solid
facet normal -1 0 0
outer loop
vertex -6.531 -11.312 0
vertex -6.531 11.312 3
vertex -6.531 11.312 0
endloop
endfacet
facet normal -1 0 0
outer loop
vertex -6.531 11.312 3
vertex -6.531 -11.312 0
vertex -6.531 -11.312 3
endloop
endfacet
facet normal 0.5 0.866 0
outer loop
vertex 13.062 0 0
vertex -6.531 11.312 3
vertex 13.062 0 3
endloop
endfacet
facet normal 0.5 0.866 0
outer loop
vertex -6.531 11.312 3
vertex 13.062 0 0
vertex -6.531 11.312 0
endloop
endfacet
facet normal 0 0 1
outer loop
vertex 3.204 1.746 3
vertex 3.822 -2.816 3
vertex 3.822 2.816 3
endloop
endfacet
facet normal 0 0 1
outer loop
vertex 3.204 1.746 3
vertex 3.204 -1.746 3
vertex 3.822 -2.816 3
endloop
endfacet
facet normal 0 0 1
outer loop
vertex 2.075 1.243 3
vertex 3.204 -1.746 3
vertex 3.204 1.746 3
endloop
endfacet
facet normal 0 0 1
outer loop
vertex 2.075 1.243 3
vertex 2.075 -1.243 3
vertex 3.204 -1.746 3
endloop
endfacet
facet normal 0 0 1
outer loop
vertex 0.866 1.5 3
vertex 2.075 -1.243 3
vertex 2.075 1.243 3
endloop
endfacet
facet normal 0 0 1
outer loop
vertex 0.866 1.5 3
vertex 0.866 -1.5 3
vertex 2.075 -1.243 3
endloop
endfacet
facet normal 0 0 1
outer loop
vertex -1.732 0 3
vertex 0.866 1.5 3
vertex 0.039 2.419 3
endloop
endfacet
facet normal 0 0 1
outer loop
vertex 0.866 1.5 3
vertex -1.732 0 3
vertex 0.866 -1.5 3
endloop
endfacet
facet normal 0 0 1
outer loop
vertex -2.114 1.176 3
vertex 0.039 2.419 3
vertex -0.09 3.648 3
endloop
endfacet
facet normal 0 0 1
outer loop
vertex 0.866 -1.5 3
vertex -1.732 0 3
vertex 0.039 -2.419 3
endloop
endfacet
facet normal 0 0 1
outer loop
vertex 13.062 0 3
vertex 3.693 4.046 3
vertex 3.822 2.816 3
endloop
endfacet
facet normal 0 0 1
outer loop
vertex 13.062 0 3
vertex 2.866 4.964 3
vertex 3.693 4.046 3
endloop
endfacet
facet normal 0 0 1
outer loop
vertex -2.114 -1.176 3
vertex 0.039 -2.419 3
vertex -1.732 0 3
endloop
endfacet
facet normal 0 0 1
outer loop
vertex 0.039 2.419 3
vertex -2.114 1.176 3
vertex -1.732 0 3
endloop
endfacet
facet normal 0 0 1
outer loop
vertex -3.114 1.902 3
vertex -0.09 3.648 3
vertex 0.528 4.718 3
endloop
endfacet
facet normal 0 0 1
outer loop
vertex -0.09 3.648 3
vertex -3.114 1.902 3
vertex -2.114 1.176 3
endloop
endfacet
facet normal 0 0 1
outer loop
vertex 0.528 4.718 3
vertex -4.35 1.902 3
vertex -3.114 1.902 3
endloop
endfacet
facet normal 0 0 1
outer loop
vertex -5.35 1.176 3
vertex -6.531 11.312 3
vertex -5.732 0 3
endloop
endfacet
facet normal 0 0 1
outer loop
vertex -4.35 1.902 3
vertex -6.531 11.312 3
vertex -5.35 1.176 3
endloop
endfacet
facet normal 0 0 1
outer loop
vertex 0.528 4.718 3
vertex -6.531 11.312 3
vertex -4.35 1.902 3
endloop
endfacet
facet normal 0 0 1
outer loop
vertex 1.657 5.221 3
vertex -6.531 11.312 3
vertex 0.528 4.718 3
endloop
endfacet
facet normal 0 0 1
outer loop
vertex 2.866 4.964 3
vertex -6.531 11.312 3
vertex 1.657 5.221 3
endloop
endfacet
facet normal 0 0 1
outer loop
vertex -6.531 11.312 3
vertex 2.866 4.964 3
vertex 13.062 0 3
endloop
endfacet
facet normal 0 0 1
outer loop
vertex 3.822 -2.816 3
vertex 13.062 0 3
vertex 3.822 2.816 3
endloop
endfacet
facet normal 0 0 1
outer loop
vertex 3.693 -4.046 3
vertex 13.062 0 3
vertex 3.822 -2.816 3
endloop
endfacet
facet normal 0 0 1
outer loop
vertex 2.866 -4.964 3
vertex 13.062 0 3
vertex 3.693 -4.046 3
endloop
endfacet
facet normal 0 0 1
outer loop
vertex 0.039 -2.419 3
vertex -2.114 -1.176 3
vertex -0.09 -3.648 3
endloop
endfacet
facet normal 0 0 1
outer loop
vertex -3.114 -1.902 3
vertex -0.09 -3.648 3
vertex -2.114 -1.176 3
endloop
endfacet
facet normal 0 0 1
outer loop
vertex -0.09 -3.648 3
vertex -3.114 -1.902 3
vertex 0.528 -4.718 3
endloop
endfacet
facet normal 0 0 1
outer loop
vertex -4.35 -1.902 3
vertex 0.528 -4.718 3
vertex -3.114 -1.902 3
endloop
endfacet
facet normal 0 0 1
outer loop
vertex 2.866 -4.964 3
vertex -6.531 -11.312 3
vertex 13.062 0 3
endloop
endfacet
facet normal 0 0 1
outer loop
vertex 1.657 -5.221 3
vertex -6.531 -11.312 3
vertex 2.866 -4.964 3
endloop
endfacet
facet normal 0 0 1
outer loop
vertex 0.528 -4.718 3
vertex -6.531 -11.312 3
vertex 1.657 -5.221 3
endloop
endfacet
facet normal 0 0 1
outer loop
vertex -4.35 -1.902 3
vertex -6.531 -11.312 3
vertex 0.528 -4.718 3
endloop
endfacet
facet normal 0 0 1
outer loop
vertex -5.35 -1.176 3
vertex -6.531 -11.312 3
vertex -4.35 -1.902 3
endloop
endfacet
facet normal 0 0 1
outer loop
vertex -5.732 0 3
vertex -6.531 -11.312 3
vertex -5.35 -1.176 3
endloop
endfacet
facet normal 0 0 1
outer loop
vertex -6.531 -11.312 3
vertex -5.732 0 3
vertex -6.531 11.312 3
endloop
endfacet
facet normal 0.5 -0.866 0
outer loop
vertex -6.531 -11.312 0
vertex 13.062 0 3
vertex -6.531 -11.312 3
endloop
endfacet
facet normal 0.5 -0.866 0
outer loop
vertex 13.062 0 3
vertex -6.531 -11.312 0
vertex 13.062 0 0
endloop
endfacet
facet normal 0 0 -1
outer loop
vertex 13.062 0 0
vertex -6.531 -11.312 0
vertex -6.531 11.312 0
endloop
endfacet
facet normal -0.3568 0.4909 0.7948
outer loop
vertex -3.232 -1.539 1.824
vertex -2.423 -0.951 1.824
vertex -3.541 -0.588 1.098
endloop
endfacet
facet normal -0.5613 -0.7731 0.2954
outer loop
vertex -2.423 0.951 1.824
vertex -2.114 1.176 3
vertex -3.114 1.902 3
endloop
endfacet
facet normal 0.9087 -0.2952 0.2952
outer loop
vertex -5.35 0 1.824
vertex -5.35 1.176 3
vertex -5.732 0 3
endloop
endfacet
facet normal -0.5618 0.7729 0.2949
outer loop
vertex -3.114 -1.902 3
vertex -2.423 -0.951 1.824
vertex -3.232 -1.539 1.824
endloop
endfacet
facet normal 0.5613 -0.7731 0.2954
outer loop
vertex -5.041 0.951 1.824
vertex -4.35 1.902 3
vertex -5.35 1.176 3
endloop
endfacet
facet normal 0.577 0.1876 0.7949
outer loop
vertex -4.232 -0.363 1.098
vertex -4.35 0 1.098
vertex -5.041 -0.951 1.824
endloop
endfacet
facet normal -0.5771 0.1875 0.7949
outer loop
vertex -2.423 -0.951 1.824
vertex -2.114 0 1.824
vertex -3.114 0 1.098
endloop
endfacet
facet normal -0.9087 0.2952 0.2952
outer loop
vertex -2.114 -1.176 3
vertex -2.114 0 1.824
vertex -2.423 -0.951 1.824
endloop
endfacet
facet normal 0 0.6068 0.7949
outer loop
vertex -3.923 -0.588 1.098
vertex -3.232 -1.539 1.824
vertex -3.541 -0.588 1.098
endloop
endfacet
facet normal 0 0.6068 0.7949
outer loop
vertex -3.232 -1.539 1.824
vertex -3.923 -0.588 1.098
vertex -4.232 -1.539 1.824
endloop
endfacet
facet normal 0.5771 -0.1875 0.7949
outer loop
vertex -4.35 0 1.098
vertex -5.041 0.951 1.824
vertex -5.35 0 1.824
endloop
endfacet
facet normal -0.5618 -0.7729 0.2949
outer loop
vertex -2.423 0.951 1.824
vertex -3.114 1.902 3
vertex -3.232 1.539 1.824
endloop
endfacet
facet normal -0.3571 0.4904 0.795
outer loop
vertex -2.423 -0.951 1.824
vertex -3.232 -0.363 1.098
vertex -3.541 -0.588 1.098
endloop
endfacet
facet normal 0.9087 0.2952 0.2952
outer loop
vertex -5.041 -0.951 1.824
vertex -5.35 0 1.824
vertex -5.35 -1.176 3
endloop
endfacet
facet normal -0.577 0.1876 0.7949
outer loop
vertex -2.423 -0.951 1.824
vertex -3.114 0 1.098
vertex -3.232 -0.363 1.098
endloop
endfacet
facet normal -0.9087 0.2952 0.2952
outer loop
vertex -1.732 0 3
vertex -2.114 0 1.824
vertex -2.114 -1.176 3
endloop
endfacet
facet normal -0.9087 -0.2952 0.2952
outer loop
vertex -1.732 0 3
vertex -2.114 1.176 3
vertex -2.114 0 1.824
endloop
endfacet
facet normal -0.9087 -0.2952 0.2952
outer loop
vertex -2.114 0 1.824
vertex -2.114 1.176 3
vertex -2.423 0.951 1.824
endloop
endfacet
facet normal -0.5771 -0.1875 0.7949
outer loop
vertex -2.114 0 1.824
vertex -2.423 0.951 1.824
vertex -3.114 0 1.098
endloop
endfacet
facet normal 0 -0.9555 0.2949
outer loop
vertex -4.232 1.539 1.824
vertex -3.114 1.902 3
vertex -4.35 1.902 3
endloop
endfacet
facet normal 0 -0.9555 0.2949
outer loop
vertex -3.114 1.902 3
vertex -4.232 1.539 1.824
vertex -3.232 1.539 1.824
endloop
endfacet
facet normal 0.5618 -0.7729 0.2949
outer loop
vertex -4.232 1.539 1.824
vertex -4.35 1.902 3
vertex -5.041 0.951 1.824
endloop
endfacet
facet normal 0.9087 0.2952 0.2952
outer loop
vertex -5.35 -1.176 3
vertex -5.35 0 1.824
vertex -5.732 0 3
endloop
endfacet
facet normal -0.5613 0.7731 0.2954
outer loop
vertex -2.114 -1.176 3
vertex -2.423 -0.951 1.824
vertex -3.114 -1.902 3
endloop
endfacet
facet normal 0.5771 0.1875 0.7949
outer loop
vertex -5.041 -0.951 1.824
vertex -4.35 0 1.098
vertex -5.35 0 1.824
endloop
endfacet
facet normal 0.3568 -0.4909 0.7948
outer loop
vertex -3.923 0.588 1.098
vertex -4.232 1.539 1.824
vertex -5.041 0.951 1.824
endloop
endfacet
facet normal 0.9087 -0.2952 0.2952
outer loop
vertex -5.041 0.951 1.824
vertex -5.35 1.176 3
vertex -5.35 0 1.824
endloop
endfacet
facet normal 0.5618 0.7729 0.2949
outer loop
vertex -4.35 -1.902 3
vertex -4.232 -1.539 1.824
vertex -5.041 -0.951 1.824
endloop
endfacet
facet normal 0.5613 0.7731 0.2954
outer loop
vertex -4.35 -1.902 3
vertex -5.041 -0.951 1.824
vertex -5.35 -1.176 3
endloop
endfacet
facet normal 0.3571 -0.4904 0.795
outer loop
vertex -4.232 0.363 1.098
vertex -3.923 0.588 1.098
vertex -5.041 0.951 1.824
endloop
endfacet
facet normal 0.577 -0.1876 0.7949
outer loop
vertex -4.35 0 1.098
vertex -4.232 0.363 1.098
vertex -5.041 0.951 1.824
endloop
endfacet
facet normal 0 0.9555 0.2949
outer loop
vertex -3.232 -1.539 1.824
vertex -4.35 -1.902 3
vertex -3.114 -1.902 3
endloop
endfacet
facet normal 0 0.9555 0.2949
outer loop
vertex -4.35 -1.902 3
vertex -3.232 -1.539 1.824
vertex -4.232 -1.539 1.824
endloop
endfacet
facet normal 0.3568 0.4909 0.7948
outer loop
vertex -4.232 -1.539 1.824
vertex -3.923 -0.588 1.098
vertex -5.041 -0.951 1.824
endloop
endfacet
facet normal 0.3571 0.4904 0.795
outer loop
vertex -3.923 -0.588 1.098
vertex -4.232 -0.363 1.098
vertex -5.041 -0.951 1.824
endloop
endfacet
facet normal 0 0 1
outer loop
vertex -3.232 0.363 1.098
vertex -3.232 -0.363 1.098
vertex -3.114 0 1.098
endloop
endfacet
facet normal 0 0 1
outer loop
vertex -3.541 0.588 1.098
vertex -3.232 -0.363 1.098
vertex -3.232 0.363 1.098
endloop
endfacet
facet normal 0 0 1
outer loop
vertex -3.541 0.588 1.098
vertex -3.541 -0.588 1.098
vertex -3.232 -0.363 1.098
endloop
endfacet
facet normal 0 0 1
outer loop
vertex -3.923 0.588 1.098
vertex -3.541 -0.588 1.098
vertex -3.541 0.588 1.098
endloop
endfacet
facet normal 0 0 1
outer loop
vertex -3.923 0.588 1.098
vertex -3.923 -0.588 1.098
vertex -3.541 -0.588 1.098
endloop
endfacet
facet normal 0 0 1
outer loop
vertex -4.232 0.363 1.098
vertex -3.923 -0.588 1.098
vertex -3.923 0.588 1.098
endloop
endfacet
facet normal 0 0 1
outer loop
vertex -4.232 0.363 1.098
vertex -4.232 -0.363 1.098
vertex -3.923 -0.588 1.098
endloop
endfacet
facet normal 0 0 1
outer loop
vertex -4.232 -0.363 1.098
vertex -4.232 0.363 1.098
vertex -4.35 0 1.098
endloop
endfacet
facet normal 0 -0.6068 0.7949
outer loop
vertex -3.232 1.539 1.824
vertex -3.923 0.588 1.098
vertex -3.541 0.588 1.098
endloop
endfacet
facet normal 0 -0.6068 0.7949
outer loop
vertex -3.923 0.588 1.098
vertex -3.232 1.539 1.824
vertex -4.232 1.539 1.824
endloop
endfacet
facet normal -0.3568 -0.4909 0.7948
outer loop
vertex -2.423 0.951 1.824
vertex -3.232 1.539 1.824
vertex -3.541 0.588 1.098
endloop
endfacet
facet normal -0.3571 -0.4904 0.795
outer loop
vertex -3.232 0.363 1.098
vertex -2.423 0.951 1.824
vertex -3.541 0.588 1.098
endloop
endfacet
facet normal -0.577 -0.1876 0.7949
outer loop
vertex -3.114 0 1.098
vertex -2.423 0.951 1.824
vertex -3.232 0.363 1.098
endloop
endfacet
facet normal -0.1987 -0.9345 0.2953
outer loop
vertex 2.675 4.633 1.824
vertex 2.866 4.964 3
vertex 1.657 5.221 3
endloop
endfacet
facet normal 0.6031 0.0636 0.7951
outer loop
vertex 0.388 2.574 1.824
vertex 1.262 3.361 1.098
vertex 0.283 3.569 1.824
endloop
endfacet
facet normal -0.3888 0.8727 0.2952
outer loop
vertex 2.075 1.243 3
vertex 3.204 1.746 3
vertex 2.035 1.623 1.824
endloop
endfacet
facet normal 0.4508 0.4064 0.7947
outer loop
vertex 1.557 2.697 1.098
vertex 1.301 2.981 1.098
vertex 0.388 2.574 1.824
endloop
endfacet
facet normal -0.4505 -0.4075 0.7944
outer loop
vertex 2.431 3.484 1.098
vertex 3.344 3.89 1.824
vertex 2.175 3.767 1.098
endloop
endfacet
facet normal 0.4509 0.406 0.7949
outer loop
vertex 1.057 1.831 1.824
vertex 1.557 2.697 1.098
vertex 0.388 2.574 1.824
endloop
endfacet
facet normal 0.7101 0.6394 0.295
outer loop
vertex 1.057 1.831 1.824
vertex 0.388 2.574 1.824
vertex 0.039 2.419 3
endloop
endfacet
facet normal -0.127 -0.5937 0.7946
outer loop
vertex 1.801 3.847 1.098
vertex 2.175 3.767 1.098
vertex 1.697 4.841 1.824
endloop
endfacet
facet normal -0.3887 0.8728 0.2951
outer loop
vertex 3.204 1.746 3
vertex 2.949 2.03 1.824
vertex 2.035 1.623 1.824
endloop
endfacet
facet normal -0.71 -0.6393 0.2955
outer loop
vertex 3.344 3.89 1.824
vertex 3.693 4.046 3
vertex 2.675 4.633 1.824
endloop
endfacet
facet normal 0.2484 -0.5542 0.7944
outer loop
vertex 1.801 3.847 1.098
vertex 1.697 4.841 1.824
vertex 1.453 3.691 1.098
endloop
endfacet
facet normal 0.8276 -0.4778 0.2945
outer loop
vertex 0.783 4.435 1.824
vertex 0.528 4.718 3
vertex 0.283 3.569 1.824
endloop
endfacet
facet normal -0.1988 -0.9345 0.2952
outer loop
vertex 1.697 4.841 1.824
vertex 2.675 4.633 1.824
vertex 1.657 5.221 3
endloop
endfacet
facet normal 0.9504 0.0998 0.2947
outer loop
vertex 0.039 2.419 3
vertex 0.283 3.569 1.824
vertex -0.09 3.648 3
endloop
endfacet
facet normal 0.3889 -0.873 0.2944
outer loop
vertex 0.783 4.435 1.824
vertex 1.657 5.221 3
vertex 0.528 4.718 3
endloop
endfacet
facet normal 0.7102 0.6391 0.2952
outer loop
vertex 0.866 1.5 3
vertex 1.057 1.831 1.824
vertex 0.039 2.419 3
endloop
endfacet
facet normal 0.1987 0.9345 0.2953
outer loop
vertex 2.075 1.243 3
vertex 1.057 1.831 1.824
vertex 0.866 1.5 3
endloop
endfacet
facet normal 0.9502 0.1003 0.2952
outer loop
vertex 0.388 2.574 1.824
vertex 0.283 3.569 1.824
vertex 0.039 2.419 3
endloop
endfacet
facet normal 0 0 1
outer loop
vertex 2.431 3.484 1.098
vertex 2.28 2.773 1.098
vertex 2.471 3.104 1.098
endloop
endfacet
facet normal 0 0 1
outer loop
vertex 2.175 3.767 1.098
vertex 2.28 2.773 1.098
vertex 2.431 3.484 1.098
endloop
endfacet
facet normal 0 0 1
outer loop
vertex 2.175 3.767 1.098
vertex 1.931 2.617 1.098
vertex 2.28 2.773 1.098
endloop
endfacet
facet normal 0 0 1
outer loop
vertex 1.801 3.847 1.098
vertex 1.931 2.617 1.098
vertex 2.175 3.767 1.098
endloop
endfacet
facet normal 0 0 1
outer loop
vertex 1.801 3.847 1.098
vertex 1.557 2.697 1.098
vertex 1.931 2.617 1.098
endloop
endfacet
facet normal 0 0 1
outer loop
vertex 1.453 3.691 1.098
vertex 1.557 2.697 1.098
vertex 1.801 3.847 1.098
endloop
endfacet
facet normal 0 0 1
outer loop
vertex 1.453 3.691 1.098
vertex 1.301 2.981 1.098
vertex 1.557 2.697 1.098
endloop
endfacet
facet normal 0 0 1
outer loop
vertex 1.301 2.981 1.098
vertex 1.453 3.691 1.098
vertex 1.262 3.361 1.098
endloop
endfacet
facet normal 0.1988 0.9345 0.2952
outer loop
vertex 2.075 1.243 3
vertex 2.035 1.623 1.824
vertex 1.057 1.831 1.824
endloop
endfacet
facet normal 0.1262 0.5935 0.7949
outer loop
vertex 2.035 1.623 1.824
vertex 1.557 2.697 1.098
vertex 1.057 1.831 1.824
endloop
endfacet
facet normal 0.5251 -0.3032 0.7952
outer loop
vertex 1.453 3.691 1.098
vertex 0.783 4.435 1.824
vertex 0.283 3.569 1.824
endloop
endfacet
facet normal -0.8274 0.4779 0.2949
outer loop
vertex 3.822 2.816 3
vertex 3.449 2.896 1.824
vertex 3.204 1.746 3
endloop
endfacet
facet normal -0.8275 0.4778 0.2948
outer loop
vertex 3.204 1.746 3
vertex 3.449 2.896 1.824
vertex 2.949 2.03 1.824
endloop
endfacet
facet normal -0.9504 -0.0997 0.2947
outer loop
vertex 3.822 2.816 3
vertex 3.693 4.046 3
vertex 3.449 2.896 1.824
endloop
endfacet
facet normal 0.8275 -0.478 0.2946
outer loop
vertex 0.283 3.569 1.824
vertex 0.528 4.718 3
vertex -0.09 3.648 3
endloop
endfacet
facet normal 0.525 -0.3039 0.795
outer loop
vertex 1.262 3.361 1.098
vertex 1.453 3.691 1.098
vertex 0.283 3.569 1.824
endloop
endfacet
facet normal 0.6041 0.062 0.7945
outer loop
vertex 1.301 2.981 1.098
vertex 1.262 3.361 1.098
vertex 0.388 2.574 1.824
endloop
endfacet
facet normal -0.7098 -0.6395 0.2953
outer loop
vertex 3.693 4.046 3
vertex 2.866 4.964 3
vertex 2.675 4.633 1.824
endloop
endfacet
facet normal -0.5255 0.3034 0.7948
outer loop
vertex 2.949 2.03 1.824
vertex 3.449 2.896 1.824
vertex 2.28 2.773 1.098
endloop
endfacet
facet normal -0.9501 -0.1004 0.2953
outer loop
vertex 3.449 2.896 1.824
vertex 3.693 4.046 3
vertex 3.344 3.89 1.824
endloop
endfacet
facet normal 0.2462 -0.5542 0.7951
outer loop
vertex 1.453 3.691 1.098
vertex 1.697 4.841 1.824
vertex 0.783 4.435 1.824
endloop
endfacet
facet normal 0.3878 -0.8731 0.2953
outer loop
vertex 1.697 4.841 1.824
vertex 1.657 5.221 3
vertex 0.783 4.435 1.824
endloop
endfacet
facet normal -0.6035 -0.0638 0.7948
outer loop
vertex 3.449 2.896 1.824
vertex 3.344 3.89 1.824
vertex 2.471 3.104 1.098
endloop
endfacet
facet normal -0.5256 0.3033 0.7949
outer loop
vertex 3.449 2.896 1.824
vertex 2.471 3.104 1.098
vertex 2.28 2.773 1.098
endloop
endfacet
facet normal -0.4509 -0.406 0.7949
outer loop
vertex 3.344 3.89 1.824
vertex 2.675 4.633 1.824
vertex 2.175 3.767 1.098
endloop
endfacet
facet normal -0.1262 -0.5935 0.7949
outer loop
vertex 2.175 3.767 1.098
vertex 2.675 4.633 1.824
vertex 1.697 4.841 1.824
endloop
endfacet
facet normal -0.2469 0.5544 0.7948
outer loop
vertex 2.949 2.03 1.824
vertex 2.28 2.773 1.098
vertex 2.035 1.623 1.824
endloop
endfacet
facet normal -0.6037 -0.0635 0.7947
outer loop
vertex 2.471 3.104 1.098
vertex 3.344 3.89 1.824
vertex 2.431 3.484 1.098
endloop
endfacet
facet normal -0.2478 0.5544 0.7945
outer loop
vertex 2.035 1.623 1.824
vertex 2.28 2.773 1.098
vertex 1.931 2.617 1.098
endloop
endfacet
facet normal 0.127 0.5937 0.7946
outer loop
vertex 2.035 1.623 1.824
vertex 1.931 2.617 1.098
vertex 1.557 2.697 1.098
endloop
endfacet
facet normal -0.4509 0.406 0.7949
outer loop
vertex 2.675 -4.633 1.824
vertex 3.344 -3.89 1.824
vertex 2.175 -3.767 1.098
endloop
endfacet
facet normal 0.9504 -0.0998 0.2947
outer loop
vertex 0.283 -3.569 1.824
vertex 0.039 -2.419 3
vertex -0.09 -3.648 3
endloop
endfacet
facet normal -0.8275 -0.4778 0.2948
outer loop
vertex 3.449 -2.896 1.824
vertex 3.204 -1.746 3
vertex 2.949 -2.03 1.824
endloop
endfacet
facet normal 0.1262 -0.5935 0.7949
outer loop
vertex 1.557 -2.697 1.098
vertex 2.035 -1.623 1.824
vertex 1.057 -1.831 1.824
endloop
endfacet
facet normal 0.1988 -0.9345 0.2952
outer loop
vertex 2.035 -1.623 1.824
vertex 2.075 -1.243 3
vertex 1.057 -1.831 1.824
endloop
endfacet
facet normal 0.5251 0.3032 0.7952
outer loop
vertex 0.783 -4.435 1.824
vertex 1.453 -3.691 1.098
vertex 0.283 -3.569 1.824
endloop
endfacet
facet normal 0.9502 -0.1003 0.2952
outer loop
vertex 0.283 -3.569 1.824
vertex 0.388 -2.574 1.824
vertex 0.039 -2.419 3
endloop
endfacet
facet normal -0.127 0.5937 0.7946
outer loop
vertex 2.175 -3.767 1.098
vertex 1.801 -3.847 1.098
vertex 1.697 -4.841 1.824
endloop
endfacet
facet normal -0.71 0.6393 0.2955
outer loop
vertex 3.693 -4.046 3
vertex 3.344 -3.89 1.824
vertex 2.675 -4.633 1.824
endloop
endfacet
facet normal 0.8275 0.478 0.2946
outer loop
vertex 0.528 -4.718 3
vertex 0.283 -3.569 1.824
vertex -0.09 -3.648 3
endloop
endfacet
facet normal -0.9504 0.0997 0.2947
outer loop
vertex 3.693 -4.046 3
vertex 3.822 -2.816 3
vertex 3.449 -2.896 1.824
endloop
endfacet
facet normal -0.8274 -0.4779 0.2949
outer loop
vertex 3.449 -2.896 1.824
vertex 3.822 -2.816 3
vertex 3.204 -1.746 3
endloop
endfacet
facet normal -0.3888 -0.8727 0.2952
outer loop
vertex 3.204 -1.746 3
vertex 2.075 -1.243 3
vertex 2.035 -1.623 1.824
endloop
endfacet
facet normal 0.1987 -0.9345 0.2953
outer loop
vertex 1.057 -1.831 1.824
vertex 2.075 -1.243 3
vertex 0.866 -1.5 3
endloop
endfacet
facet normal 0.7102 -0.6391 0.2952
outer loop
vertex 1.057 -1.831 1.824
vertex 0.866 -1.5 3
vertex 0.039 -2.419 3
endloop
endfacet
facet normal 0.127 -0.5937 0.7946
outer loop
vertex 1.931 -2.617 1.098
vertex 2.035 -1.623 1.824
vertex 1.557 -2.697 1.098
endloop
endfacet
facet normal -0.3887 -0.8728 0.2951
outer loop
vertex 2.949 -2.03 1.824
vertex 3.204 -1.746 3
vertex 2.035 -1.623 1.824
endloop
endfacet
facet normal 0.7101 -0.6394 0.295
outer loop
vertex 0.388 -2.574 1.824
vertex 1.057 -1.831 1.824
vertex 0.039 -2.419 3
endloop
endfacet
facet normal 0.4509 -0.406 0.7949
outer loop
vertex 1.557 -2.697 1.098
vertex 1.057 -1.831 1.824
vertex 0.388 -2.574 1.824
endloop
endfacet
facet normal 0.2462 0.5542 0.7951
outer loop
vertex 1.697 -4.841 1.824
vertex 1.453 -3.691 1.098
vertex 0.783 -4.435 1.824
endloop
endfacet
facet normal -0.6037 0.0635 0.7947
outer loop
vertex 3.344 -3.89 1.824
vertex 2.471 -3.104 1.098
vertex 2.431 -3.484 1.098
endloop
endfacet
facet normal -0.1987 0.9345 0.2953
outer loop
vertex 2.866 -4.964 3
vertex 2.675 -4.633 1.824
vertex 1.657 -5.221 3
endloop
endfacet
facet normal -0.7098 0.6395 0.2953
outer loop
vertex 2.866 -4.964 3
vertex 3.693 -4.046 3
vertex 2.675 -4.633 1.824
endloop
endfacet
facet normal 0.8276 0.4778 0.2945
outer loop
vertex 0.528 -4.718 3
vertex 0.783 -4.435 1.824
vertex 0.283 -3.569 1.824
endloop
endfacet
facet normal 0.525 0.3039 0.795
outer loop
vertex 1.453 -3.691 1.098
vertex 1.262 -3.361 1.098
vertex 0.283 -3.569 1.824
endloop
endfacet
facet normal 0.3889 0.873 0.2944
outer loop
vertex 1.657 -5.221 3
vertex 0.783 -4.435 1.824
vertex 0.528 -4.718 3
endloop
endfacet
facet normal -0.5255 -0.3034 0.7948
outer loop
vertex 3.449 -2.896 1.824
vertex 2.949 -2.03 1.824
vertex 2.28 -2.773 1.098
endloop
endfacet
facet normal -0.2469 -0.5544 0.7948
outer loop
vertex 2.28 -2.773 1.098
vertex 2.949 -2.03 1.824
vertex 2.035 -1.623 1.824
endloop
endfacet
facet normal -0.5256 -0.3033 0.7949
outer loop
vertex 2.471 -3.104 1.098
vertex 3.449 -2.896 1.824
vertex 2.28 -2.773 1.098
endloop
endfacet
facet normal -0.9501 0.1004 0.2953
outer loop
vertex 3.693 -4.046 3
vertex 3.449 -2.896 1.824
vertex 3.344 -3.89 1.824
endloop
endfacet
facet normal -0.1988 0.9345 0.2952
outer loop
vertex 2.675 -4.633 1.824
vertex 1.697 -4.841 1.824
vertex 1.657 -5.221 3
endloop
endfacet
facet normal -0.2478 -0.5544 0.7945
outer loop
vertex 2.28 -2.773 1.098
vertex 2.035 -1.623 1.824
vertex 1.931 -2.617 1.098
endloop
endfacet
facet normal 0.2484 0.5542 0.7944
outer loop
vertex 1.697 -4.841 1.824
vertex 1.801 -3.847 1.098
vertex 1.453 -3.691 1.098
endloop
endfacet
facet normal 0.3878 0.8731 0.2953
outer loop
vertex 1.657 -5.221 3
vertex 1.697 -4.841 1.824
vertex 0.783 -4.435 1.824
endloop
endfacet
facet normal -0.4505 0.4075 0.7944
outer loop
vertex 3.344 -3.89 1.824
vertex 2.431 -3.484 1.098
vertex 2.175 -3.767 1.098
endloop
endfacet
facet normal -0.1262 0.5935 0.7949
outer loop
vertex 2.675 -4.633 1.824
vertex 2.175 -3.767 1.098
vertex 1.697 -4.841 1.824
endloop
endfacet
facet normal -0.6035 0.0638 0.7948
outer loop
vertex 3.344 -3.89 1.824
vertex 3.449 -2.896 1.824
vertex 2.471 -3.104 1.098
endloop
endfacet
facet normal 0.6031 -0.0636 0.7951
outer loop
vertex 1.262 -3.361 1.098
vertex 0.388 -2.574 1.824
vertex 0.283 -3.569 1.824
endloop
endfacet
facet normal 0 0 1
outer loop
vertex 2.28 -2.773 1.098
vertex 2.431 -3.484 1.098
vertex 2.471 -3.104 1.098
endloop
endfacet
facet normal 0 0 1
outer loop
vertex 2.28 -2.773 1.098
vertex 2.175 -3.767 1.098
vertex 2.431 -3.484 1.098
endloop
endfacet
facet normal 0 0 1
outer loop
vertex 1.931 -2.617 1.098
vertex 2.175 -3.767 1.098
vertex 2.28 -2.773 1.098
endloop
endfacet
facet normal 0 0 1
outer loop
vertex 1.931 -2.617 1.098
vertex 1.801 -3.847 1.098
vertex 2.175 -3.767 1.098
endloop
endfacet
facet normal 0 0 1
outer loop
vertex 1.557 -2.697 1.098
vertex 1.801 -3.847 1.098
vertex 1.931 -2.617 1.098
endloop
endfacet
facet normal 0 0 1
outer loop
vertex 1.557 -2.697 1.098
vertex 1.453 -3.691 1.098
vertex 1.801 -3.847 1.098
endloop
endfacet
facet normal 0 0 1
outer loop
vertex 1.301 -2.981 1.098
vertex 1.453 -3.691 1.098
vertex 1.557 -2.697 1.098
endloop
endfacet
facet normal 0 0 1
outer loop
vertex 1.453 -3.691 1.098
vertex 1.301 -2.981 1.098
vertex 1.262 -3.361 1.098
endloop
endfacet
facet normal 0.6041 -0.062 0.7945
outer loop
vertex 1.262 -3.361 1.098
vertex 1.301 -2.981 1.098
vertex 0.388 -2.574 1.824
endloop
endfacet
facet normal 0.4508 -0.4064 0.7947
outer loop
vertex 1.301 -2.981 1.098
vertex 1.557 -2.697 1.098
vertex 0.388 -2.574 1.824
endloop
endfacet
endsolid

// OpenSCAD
$size = 70;
$height = 3;
$inner_size = $size - 15;
$piece_size = ($inner_size / 4) * 0.95;


module divet() {
  translate([-($piece_size) / 3.5,0,$height]) {  
    #sphere(2, $fn=10);
  }
  
  //translate([-($piece_size) / 3.5,0,0]) {  
    //sphere(2.2, $fn=10);
  //}
}
  
module piece() {

  difference() {
    cylinder(h = $height,
           r1 = $piece_size,
           r2 = $piece_size,
           $fn = 3);
  
      
    divet();
    rotate([0,0,-120]) {
      divet();
    }
      
    rotate([0,0,120]) {
      divet();
    }
    
    
  }  
}


piece();
